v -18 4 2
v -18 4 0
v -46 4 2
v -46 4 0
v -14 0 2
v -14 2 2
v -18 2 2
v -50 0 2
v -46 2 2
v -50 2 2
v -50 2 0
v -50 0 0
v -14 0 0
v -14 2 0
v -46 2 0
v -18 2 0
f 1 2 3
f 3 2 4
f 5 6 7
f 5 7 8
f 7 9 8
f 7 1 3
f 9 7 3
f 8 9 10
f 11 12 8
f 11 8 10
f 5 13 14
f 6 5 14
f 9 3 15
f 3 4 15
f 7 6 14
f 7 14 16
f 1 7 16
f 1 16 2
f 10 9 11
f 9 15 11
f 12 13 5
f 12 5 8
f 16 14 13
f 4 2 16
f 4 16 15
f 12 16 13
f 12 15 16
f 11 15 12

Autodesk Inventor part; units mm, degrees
ref_plane "YZ Plane" through (0, 0, 0) normal (1, 0, 0) x (0, 1, 0)
ref_plane "XZ Plane" through (0, 0, 0) normal (0, 1, 0) x (-1, 0, 0)
ref_plane "XY Plane" through (0, 0, 0) normal (0, 0, 1) x (1, 0, 0)
sketch "Sketch1" plane through (0, 0, 0) normal (0, 0, 1) x (1, 0, 0)
  line L0 (0, 0) -> (-50, 0)
  line L1 (-50, 0) -> (-50, 2)
  line L2 (-46, 4) -> (-46, 2)
  line L3 (-46, 2) -> (-50, 2)
  line L4 (0, 2) -> (-4, 2)
  line L5 (-4, 2) -> (-4, 4)
  line L6 (-46, 4) -> (-26, 4)
  line L7 (0, 2) -> (0, 0)
  line L8 (-26, 4) -> (-26, 2)
  line L9 (-26, 2) -> (-24, 2)
  line L10 (-24, 2) -> (-24, 4)
  line L11 (-24, 4) -> (-4, 4)
  dimension "d2" = 4
  dimension "d3" = 2
  dimension "d5" = 24
  dimension "d6" = 2
  dimension "d7" = 2
extrude "Extrusion1" add sketch "Sketch1" along normal blind 2
sketch "Sketch2" plane through (0, 0, 2) normal (0, 0, 1) x (1, 0, 0)
  line L0 (-4, 4) -> (-24, 4) projected
  line L1 (-18, 4) -> (-16, 4)
  line L2 (-16, 4) -> (-16, 2)
  line L3 (-16, 2) -> (-18, 2)
  line L4 (-18, 2) -> (-18, 4)
  point P0 (0, 0)
  dimension "d10" = 2
  dimension "d11" = 2
  dimension "d12" = 16
extrude "Extrusion2" cut sketch "Sketch2" against normal blind 2
sketch "Sketch3" plane through (0, 0, 0) normal (0, 0, -1) x (-1, 0, 0)
  line L0 (0, 0) -> (0, 2) projected
  line L1 (4, 4) -> (16, 4) projected
  line L2 (0, 0) -> (14, 0)
  line L3 (14, 0) -> (14, 4)
  line L4 (14, 4) -> (0, 4)
  line L5 (0, 4) -> (0, 0)
  line L6 (18, 2) -> (16, 2) projected
  line L7 (16, 2) -> (14, 2)
  line L8 (14, 2) -> (14, 4)
  line L9 (14, 4) -> (16, 4)
  line L10 (16, 4) -> (16, 2)
  line L11 (18, 4) -> (24, 4) projected
  line L12 (24, 2) -> (26, 2) projected
  line L13 (24, 4) -> (26, 4)
  line L14 (26, 4) -> (26, 2)
  line L15 (26, 2) -> (24, 2)
  line L16 (24, 2) -> (24, 4)
  dimension "d15" = 14
extrude "Extrusion3" cut sketch "Sketch3" against normal blind 10 contours L0 L5 L4 L1 L3 L2 | L3 L1 L10 L7
extrude "Extrusion4" add sketch "Sketch3" against normal blind 2 contours L16 L13 L14 L12
properties part number "beam1" material "Wood (Birch)"
